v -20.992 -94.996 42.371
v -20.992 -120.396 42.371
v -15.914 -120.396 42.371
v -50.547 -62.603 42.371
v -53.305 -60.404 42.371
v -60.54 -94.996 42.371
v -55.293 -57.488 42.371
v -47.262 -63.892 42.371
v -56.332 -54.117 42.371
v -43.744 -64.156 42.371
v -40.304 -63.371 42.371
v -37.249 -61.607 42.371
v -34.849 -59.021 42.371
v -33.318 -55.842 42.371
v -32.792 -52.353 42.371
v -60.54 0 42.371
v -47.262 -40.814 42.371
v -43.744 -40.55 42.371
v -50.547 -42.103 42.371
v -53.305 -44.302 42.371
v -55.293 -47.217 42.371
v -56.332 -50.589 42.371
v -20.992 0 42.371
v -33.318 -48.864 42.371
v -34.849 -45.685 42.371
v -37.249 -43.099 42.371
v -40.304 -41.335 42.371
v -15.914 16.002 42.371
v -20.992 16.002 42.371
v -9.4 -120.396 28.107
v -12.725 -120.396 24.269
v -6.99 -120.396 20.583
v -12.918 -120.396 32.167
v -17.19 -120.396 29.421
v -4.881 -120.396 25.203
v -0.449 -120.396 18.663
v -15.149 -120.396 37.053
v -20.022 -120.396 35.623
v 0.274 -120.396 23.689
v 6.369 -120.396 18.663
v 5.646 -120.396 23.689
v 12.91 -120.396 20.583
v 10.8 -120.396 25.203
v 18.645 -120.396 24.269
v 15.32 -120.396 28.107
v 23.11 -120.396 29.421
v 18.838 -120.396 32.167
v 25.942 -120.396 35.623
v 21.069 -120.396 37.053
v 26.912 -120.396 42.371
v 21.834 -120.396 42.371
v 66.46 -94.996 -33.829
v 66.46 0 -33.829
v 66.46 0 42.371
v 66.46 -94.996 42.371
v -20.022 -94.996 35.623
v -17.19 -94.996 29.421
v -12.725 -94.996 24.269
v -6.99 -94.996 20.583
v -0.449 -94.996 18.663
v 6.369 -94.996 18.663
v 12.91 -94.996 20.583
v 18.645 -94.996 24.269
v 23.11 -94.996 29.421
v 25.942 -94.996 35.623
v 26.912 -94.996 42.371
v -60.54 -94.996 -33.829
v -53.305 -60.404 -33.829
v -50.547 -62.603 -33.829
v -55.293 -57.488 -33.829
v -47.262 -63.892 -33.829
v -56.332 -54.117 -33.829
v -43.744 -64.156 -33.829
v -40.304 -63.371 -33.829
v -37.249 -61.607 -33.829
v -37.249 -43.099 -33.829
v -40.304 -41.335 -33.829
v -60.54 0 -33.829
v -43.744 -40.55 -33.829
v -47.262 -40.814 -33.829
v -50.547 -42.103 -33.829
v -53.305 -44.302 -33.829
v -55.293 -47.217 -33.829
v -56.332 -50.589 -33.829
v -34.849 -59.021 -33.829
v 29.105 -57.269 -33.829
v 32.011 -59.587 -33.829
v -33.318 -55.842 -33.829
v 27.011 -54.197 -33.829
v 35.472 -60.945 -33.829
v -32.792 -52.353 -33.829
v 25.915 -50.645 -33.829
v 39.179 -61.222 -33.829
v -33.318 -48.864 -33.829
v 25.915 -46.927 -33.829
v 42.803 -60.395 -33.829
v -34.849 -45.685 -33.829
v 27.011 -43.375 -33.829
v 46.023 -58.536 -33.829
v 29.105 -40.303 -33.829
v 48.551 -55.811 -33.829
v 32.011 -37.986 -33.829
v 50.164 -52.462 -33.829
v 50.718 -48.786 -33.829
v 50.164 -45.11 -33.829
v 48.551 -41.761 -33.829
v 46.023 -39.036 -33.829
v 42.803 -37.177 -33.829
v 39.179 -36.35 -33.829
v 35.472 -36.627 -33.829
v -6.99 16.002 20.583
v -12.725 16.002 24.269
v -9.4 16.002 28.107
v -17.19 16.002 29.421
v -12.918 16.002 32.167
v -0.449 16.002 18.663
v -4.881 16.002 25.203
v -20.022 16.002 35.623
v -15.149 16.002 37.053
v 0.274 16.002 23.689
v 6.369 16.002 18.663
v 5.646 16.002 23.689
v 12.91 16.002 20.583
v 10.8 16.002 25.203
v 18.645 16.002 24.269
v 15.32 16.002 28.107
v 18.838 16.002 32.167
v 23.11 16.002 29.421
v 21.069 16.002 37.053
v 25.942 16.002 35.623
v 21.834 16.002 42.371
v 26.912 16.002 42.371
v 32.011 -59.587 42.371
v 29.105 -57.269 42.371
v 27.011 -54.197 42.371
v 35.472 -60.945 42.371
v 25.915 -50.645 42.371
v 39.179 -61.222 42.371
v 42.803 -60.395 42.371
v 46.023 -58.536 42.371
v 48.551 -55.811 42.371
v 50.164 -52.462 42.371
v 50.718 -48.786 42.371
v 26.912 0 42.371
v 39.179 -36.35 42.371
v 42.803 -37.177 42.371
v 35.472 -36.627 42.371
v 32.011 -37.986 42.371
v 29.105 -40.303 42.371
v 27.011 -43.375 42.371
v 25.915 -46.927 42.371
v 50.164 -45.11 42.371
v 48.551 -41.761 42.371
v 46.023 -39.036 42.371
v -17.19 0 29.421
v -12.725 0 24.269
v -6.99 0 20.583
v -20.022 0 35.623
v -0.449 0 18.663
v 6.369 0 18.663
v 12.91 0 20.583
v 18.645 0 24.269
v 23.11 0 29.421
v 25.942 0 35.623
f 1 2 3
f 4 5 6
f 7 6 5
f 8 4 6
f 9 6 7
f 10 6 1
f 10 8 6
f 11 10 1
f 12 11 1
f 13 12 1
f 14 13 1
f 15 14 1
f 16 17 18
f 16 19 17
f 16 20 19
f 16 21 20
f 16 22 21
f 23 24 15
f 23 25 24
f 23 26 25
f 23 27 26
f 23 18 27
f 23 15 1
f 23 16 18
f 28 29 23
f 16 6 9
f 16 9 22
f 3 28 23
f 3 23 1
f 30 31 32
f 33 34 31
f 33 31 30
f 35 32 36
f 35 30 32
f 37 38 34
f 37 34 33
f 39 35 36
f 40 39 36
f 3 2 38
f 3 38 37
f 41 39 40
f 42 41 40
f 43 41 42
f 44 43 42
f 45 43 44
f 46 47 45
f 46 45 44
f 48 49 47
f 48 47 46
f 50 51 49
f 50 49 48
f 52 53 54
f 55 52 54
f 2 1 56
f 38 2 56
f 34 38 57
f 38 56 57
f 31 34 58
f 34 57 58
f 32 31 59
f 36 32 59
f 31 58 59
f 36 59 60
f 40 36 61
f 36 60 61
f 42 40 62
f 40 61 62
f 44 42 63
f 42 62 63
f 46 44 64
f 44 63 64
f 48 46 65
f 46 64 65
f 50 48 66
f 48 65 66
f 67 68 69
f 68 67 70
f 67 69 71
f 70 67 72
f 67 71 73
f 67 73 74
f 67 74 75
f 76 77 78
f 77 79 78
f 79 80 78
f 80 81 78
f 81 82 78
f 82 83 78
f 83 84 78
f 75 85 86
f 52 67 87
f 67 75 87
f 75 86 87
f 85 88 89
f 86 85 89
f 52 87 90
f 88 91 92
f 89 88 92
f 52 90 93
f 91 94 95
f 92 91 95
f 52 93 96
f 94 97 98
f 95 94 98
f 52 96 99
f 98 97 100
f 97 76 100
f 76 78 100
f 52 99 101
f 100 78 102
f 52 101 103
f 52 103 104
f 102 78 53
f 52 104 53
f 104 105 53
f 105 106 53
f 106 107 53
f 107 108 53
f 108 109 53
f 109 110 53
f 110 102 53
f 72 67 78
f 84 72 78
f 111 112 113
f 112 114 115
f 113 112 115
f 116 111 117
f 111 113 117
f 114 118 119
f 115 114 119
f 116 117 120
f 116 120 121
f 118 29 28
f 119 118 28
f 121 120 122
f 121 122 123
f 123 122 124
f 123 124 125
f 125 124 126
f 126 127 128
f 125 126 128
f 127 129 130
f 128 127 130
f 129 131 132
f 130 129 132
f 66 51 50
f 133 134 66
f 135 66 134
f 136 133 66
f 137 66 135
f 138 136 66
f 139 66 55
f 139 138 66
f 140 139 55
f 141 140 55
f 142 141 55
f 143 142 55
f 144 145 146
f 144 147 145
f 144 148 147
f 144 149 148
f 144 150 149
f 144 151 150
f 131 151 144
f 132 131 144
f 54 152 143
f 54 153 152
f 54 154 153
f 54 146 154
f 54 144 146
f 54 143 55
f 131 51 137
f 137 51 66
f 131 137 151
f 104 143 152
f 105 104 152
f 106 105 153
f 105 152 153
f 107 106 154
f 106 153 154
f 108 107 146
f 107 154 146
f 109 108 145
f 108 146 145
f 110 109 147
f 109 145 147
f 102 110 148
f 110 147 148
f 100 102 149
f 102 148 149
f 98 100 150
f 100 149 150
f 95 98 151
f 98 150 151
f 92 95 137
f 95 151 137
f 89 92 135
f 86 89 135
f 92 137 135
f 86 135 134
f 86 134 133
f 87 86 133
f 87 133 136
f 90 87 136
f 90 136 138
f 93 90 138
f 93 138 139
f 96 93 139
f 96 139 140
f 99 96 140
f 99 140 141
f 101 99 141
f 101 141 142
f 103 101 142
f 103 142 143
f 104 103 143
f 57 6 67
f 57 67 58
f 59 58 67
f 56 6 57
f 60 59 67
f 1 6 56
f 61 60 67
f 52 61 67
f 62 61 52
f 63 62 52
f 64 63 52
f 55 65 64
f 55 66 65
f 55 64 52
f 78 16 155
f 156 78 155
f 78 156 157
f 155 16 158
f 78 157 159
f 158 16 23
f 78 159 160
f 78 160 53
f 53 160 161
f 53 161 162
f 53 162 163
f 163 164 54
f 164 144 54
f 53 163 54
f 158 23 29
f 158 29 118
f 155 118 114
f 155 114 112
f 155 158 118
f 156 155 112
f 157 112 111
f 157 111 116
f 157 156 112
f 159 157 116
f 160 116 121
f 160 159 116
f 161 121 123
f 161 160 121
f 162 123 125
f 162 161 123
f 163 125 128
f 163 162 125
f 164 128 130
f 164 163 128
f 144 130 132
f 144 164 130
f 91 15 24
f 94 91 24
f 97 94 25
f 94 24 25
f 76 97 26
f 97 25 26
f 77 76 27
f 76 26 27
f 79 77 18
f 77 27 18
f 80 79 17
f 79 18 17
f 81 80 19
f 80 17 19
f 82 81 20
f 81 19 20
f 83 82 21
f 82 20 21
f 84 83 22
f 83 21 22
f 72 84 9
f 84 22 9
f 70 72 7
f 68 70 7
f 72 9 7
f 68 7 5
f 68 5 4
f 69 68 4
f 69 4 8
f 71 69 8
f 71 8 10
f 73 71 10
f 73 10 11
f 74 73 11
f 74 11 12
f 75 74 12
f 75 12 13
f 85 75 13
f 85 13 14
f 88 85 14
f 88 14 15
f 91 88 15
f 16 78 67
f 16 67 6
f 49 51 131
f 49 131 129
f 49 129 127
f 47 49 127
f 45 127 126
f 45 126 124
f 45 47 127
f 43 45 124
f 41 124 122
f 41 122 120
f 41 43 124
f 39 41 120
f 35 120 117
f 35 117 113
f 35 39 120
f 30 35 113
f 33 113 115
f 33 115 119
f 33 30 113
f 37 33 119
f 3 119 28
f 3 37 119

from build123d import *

# Parameters (mm, degrees)
F0_W     = 127
F0_H     = 76.2
F1_DEPTH = 94.996
F3_DEPTH = 25.4
F4_DEPTH = 115.824
F5_DEPTH = 110.998
F6_R     = 11.8361581928
F7_DEPTH = 300.736
F8_R     = 12.4713083384
F9_DEPTH = 188.468


with BuildPart() as f1:
    # F0 (on Front) → F1 (new body)
    with BuildSketch(Plane.XZ):
        with Locations((2.9599239826, 4.2708883941)):
            Rectangle(F0_W, F0_H)
    extrude(amount=F1_DEPTH)

    # F2 (on face) → F3 (join)
    with BuildSketch(Plane.XZ.offset(94.996)):
        with BuildLine():
            Line((26.9120044817, 42.3708883941), (21.8338499293, 42.3708883941))
            ThreePointArc((21.8338499293, 42.3708883941), (2.9599239826, 23.4969624475), (-15.914001964, 42.3708883941))
            Line((-15.914001964, 42.3708883941), (-20.9921565165, 42.3708883941))
            ThreePointArc((-20.9921565165, 42.3708883941), (2.9599239826, 18.418807895), (26.9120044817, 42.3708883941))
        make_face()
    extrude(amount=F3_DEPTH)

    # F4 (cut): a face of the model
    f4_faces = [f1.faces().sort_by_distance(p)[0] for p in [
        (2.9599239826, -94.996, 34.3605454342),
    ]]
    extrude(f4_faces, amount=-F4_DEPTH, mode=Mode.SUBTRACT)

    # F2 (on face) → F5 (join)
    with BuildSketch(Plane.XZ.offset(94.996)):
        with BuildLine():
            Line((26.9120044817, 42.3708883941), (21.8338499293, 42.3708883941))
            ThreePointArc((21.8338499293, 42.3708883941), (2.9599239826, 23.4969624475), (-15.914001964, 42.3708883941))
            Line((-15.914001964, 42.3708883941), (-20.9921565165, 42.3708883941))
            ThreePointArc((-20.9921565165, 42.3708883941), (2.9599239826, 18.418807895), (26.9120044817, 42.3708883941))
        make_face()
    extrude(amount=-F5_DEPTH)

    # F6 (on face) → F7 (cut)
    with BuildSketch(Plane.XY.offset(42.3708883941)):
        with Locations((-44.6284934878, -52.3529723287)):
            Circle(F6_R)
    extrude(amount=-F7_DEPTH, mode=Mode.SUBTRACT)

    # F8 (on face) → F9 (cut)
    with BuildSketch(Plane.XY.offset(42.3708883941)):
        with Locations((38.2470600307, -48.7860329449)):
            Circle(F8_R)
    extrude(amount=-F9_DEPTH, mode=Mode.SUBTRACT)


solid = f1.part
